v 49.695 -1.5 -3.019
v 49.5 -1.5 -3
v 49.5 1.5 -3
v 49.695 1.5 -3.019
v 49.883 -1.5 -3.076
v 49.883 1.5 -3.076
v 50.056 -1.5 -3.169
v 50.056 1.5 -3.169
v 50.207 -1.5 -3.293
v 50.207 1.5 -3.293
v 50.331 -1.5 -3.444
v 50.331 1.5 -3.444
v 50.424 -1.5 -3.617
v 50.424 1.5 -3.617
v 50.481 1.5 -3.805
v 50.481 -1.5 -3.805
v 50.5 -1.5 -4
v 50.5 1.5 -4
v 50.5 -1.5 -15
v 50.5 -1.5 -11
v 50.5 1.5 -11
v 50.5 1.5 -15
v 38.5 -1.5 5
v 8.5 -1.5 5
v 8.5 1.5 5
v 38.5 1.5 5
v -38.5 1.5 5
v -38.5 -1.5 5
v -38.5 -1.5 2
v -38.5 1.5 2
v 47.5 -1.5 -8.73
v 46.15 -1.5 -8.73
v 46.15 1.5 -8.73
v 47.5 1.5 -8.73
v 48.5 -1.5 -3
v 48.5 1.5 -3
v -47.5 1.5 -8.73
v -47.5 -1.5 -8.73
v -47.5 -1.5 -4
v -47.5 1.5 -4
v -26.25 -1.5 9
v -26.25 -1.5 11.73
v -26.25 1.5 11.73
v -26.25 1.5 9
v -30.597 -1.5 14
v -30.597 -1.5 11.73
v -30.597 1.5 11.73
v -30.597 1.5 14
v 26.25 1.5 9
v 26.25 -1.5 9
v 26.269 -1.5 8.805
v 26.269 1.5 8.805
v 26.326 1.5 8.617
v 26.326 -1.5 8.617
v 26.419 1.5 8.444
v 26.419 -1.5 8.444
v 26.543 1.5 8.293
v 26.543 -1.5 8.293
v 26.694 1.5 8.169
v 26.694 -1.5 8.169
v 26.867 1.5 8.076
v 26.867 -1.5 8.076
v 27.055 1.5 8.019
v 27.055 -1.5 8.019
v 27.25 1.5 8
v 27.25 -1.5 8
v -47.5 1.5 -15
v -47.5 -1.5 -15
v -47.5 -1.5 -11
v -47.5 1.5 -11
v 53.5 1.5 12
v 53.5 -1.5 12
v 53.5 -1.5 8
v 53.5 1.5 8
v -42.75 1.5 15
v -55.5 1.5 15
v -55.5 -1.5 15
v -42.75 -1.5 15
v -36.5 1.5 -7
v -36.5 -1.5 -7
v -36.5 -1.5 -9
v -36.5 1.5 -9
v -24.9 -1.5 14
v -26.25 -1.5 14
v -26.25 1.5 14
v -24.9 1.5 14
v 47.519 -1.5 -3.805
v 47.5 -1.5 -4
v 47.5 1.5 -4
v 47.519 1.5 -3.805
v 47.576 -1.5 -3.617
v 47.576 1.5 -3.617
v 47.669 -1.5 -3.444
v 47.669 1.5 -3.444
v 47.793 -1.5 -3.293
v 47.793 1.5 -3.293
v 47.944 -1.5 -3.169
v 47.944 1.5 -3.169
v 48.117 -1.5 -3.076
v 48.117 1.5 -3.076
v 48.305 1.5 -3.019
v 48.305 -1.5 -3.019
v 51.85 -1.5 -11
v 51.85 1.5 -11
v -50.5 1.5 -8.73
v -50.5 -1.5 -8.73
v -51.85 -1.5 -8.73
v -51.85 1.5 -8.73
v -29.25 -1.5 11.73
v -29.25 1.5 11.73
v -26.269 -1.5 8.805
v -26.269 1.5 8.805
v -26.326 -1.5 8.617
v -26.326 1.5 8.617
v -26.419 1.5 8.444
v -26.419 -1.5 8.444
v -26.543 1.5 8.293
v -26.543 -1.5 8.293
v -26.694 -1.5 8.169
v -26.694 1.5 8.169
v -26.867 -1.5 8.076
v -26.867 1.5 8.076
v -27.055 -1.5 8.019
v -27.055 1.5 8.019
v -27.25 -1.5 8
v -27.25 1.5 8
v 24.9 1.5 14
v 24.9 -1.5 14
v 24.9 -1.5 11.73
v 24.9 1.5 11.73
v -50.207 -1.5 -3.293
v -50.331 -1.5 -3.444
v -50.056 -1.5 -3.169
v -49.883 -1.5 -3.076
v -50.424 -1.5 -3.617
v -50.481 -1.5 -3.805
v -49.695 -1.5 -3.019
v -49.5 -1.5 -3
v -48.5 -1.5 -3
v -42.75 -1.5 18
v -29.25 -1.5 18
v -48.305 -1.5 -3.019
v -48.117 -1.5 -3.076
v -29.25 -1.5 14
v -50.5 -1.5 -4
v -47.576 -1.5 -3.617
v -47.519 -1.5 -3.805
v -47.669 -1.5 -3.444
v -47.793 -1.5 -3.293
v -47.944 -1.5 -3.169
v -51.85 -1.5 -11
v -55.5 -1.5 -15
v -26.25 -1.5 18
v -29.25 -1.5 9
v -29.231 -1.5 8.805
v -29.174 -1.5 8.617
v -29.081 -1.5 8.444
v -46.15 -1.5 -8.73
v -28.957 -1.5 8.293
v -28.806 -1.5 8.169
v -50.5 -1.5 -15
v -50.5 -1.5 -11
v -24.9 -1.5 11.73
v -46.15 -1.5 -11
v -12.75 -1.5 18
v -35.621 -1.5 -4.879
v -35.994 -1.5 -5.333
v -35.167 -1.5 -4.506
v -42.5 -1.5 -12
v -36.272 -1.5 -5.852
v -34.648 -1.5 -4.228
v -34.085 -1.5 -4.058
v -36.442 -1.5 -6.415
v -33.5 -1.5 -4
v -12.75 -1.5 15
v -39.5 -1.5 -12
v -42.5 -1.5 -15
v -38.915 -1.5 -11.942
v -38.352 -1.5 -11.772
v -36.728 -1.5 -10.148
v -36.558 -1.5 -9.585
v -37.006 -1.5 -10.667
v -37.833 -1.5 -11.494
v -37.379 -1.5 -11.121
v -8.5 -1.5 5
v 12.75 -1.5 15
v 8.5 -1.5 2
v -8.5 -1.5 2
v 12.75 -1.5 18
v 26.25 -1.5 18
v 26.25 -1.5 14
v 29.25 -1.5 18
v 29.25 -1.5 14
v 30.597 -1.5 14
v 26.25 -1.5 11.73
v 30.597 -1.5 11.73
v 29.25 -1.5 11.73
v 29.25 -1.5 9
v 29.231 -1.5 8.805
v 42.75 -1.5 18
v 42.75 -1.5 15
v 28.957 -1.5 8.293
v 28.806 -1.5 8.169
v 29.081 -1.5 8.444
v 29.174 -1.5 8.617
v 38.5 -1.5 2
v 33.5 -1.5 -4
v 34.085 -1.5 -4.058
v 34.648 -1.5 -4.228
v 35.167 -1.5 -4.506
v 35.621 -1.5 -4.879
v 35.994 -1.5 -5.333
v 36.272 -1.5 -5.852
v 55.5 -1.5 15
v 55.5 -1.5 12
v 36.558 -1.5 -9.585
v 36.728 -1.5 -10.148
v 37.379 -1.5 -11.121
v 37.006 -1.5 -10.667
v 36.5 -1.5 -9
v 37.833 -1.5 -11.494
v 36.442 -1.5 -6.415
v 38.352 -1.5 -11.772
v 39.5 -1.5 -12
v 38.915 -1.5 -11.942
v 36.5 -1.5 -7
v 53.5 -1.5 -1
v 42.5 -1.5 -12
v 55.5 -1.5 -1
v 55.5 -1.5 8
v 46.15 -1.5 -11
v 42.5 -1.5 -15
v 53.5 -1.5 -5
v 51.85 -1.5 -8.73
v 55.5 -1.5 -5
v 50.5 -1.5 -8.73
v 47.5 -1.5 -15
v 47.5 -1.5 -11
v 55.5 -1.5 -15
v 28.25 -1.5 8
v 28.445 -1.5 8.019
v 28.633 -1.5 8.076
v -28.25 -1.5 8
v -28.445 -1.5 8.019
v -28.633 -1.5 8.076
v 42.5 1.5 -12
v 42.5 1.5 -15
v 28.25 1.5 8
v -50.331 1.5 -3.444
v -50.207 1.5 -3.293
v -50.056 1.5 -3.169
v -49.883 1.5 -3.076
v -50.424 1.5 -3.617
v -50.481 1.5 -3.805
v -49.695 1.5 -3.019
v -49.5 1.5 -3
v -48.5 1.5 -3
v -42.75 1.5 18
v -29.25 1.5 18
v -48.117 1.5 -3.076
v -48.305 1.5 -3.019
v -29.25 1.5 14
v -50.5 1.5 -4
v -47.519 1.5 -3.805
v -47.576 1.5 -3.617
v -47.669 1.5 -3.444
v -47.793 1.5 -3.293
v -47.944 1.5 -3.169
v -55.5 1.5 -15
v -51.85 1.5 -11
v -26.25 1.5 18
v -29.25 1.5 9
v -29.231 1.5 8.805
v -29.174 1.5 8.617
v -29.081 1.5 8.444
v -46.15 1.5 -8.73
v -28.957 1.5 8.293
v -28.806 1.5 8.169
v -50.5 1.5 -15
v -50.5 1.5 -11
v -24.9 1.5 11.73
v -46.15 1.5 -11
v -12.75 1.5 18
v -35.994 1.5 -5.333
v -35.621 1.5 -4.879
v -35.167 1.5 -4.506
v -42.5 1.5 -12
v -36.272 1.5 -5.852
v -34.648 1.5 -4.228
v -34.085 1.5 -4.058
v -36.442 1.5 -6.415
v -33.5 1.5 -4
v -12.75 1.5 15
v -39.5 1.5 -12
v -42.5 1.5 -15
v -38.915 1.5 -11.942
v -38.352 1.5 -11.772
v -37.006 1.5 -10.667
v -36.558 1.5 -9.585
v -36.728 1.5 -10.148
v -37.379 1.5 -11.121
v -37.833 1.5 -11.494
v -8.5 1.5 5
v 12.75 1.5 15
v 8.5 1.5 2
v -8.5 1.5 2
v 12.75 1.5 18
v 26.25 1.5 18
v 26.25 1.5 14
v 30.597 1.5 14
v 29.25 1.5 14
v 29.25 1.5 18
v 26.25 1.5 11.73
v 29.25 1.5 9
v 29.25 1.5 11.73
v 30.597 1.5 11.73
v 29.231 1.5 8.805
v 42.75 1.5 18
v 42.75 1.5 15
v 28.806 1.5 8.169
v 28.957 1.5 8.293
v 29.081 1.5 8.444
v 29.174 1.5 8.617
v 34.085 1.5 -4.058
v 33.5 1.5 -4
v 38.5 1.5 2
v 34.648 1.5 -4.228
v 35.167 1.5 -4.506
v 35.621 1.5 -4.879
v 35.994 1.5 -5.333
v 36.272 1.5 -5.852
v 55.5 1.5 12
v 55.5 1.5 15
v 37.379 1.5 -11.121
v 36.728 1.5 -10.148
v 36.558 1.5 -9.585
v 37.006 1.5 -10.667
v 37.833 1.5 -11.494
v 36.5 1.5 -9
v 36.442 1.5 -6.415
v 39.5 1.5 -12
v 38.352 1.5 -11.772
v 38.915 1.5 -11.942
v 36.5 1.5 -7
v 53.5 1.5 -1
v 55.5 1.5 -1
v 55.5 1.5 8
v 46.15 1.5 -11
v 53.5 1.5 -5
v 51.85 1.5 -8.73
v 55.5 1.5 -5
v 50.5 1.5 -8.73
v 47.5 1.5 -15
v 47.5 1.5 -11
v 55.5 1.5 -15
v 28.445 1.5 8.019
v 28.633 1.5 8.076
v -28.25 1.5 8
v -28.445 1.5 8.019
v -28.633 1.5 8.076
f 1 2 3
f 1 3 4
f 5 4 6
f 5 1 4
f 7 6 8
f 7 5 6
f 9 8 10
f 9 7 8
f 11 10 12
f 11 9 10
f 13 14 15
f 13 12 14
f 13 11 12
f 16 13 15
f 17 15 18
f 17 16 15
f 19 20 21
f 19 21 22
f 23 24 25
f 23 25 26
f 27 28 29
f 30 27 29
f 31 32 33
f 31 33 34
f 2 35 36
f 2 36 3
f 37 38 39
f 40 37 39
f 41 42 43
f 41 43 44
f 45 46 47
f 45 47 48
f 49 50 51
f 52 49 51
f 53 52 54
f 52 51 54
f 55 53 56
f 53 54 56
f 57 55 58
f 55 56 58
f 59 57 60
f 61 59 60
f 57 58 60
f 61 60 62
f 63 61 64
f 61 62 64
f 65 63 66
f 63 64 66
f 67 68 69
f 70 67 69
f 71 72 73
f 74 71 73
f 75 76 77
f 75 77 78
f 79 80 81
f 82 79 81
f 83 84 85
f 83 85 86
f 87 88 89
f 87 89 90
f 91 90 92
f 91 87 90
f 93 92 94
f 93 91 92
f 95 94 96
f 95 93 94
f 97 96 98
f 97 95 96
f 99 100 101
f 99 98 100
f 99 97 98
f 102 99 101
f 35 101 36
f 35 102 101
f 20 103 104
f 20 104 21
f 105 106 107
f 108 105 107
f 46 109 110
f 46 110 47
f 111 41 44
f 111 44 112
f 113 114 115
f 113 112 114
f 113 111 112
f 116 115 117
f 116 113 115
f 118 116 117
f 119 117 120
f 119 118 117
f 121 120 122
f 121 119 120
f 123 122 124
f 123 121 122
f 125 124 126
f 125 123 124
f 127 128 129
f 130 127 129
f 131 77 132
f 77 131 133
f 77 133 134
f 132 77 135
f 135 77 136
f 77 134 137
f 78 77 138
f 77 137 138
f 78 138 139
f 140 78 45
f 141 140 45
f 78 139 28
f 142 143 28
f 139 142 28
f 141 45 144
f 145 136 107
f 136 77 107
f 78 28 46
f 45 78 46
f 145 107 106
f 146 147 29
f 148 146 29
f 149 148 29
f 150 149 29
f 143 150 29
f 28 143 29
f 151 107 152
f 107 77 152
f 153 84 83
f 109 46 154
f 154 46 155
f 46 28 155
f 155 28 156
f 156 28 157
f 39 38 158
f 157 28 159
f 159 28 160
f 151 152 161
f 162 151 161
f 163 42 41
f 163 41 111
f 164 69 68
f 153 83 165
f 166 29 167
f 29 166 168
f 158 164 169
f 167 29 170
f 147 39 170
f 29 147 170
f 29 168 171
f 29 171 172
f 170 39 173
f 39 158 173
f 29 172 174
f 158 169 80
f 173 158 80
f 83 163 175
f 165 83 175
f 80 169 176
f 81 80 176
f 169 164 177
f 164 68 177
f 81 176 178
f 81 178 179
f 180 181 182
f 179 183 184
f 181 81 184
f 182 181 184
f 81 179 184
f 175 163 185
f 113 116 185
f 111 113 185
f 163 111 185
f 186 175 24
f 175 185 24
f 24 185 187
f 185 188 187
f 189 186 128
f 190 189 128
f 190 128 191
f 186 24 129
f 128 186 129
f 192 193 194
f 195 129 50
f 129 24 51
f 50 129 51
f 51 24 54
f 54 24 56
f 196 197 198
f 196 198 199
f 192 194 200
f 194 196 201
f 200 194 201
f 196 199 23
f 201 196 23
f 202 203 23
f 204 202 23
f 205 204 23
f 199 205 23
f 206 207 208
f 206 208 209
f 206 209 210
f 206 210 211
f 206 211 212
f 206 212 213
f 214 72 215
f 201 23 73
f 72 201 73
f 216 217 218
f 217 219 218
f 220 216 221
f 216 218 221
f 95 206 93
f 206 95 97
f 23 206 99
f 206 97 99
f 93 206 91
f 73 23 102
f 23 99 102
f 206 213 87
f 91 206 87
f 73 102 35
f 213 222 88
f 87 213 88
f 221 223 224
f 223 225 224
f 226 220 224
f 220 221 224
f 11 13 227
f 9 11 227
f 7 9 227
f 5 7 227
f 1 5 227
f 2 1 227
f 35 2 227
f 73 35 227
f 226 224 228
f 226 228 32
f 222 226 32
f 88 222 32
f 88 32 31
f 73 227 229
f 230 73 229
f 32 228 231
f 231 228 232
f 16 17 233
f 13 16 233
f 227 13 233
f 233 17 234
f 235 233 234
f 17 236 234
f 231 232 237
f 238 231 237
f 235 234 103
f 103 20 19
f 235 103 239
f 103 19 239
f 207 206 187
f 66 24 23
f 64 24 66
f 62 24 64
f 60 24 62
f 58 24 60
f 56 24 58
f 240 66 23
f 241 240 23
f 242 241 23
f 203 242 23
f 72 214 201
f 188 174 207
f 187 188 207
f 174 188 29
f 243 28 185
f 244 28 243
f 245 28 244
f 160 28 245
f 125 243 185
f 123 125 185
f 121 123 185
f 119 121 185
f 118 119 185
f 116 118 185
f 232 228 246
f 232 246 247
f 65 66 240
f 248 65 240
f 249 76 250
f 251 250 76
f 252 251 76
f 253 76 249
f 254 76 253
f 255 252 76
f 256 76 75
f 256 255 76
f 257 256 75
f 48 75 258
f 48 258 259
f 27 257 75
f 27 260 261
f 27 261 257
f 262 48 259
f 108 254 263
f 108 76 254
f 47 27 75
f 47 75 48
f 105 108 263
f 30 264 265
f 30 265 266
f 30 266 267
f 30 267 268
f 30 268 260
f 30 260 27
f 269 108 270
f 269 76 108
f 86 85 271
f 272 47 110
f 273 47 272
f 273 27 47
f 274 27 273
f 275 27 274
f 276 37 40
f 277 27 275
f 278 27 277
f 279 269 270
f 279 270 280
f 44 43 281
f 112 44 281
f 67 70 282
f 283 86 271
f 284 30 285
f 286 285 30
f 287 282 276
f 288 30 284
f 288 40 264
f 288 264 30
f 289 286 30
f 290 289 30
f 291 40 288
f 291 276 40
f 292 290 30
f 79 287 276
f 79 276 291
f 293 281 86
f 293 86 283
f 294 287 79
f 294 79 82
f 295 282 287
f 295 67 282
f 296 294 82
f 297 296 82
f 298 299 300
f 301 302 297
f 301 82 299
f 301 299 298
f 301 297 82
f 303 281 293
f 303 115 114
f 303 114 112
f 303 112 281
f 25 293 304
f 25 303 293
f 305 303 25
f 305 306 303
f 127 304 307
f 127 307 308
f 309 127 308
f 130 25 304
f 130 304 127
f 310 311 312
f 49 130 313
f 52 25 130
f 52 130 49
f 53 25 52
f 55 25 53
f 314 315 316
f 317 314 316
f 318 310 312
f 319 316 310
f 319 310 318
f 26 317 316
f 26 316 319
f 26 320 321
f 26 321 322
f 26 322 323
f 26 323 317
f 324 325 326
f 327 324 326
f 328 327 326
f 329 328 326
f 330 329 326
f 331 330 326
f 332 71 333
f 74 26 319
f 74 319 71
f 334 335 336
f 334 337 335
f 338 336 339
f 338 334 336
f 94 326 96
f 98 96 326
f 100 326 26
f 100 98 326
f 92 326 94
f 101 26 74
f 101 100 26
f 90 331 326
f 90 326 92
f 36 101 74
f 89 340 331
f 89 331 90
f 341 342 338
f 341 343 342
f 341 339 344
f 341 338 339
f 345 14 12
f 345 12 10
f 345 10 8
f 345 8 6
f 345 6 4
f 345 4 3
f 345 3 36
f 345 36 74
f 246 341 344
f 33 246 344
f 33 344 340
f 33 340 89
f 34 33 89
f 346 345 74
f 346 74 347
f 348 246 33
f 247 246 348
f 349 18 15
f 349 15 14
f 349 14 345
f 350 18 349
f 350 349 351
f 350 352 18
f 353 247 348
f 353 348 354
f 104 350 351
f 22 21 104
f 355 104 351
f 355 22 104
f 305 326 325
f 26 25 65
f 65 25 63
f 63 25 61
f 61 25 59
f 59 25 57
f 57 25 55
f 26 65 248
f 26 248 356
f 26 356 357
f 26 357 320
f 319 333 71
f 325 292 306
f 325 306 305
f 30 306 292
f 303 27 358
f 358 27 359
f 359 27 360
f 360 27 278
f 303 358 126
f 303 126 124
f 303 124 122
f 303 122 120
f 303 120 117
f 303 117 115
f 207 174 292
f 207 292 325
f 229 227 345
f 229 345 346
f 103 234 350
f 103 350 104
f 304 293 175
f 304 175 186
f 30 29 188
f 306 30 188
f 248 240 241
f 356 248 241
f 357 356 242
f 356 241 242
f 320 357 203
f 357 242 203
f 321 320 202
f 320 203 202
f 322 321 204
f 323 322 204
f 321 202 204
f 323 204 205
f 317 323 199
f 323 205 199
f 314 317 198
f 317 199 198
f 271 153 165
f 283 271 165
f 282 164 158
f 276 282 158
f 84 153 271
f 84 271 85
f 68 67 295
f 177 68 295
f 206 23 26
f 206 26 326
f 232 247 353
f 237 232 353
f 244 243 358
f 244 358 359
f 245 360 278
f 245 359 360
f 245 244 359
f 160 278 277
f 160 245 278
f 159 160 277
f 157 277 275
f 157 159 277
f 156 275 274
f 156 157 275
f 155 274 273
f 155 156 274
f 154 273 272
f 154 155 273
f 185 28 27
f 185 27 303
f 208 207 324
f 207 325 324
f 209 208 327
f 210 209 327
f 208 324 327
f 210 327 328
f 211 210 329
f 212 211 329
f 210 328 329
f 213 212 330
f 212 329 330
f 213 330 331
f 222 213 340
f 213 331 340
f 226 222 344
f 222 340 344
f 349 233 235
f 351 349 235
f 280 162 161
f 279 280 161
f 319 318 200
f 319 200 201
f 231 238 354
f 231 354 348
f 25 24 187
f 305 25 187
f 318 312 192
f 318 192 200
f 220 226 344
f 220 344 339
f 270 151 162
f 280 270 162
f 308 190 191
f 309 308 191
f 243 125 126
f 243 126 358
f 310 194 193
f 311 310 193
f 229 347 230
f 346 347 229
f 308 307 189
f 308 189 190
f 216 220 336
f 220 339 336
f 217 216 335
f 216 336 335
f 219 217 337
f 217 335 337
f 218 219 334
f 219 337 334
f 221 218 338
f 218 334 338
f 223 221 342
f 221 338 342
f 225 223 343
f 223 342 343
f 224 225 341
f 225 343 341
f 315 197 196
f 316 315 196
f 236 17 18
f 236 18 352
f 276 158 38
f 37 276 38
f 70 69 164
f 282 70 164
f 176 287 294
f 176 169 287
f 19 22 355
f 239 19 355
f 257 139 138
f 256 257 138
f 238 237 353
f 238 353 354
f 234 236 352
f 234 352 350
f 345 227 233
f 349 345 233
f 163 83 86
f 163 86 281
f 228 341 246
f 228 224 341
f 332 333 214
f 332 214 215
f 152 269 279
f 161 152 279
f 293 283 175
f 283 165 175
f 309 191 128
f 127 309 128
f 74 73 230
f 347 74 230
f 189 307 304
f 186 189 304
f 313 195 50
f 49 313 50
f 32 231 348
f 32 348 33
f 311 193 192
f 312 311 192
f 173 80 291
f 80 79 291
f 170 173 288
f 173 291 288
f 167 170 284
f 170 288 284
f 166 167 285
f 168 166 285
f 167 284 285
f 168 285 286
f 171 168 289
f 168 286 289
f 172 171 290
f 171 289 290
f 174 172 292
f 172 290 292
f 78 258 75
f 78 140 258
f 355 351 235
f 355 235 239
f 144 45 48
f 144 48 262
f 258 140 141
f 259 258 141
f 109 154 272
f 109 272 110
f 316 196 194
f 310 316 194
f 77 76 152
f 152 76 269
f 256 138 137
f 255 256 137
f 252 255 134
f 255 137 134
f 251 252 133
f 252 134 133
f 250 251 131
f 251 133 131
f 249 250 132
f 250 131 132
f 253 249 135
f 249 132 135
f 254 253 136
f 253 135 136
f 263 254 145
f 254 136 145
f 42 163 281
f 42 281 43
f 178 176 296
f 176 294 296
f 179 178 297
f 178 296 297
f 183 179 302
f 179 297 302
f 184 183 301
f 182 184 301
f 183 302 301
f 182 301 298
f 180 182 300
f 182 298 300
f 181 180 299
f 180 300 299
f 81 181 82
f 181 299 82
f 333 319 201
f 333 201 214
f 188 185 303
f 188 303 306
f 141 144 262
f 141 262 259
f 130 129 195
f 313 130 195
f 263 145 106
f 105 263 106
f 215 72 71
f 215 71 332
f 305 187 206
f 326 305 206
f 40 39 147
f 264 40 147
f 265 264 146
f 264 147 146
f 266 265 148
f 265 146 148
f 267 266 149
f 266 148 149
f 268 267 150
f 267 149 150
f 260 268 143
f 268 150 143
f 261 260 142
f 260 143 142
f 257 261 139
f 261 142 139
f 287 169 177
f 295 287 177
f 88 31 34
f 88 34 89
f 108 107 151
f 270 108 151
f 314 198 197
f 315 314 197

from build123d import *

# Parameters (mm, degrees)
SKETCH1_W               = 111
SKETCH1_H               = 30
BOSS_EXTRUDE1_DEPTH     = 1.5
SKETCH2_W               = 30
SKETCH2_H               = 3
BOSS_EXTRUDE2_DEPTH     = 1.5
CUT_EXTRUDE2_DEPTH      = 59.365229375
CUT_EXTRUDE2_DEPTH_BACK = 59.365229375
CUT_EXTRUDE3_DEPTH      = 59.365229375
CUT_EXTRUDE3_DEPTH_BACK = 59.365229375
SKETCH6_W               = 2
SKETCH6_H               = 4
CUT_EXTRUDE4_DEPTH      = 59.423026282
CUT_EXTRUDE4_DEPTH_BACK = 59.423026282
SKETCH7_W               = 30
SKETCH7_H               = 3
CUT_EXTRUDE5_DEPTH      = 59.365229375
CUT_EXTRUDE5_DEPTH_BACK = 59.365229375
SKETCH8_W               = 85
SKETCH8_H               = 3
CUT_EXTRUDE7_DEPTH      = 59.365229375
CUT_EXTRUDE7_DEPTH_BACK = 59.365229375
SKETCH10_W              = 73
SKETCH10_H              = 8
FILLET1_R               = 3
CUT_EXTRUDE6_DEPTH      = 59.365229375
CUT_EXTRUDE6_DEPTH_BACK = 59.365229375


with BuildPart() as part:
    # Sketch1 → Boss-Extrude1 (new, symmetric)
    with BuildSketch(Plane(origin=(0, 0, 0), x_dir=(1, 0, 0), z_dir=(0, 1, 0))):
        Rectangle(SKETCH1_W, SKETCH1_H)
    extrude(amount=BOSS_EXTRUDE1_DEPTH, both=True)

    # Sketch2 → Boss-Extrude2 (add, symmetric)
    with BuildSketch(Plane(origin=(0, 0, 0), x_dir=(1, 0, 0), z_dir=(0, 1, 0))):
        with Locations((-27.75, -16.5)):
            Rectangle(SKETCH2_W, SKETCH2_H)
        with Locations((27.75, -16.5)):
            Rectangle(SKETCH2_W, SKETCH2_H)
    extrude(amount=BOSS_EXTRUDE2_DEPTH, both=True)

    # Sketch5 → Cut-Extrude2 (cut, two sides: drawn at the far end of the back side and taken through both)
    with BuildSketch(Plane(origin=(0, 0, 0), x_dir=(1, 0, 0), z_dir=(0, 1, 0)).offset(-CUT_EXTRUDE2_DEPTH_BACK)):
        with BuildLine():
            Line((-29.25, -18), (-26.25, -18))
            Line((-26.25, -18), (-26.25, -14))
            Line((-26.25, -14), (-24.9, -14))
            Line((-24.9, -14), (-24.9, -11.73))
            Line((-24.9, -11.73), (-26.25, -11.73))
            Line((-26.25, -11.73), (-26.25, -9))
            ThreePointArc((-26.25, -9), (-26.542893219, -8.292893219), (-27.25, -8))
            Line((-27.25, -8), (-28.25, -8))
            ThreePointArc((-28.25, -8), (-28.957106781, -8.292893219), (-29.25, -9))
            Line((-29.25, -9), (-29.25, -11.73))
            Line((-29.25, -11.73), (-30.596948556, -11.73))
            Line((-30.596948556, -11.73), (-30.596948556, -14))
            Line((-30.596948556, -14), (-29.25, -14))
            Line((-29.25, -14), (-29.25, -18))
        make_face()
        with BuildLine():
            Line((26.25, -14), (24.9, -14))
            Line((24.9, -14), (24.9, -11.73))
            Line((24.9, -11.73), (26.25, -11.73))
            Line((26.25, -11.73), (26.25, -9))
            ThreePointArc((26.25, -9), (26.542893219, -8.292893219), (27.25, -8))
            Line((27.25, -8), (28.25, -8))
            ThreePointArc((28.25, -8), (28.957106781, -8.292893219), (29.25, -9))
            Line((29.25, -9), (29.25, -11.73))
            Line((29.25, -11.73), (30.596948556, -11.73))
            Line((30.596948556, -11.73), (30.596948556, -14))
            Line((30.596948556, -14), (29.25, -14))
            Line((29.25, -14), (29.25, -18))
            Line((29.25, -18), (26.25, -18))
            Line((26.25, -18), (26.25, -14))
        make_face()
    extrude(amount=CUT_EXTRUDE2_DEPTH + CUT_EXTRUDE2_DEPTH_BACK, mode=Mode.SUBTRACT)

    # Sketch6 → Cut-Extrude3 (cut, two sides: drawn at the far end of the back side and taken through both)
    with BuildSketch(Plane(origin=(0, 0, 0), x_dir=(1, 0, 0), z_dir=(0, 1, 0)).offset(-CUT_EXTRUDE3_DEPTH_BACK)):
        with Locations((54.5, -10)):
            Rectangle(SKETCH6_W, SKETCH6_H)
        with Locations((54.5, 3)):
            Rectangle(SKETCH6_W, SKETCH6_H)
    extrude(amount=CUT_EXTRUDE3_DEPTH + CUT_EXTRUDE3_DEPTH_BACK, mode=Mode.SUBTRACT)

    # Sketch7 → Cut-Extrude4 (cut, two sides: drawn at the far end of the back side and taken through both)
    with BuildSketch(Plane(origin=(0, 1.5, 0), x_dir=(1, 0, 0), z_dir=(0, 1, 0)).offset(-CUT_EXTRUDE4_DEPTH_BACK)):
        with Locations((-23.5, -3.5)):
            Rectangle(SKETCH7_W, SKETCH7_H)
        with Locations((23.5, -3.5)):
            Rectangle(SKETCH7_W, SKETCH7_H)
    extrude(amount=CUT_EXTRUDE4_DEPTH + CUT_EXTRUDE4_DEPTH_BACK, mode=Mode.SUBTRACT)

    # Sketch8 → Cut-Extrude5 (cut, two sides: drawn at the far end of the back side and taken through both)
    with BuildSketch(Plane(origin=(0, 0, 0), x_dir=(1, 0, 0), z_dir=(0, 1, 0)).offset(-CUT_EXTRUDE5_DEPTH_BACK)):
        with Locations((0, 13.5)):
            Rectangle(SKETCH8_W, SKETCH8_H)
    extrude(amount=CUT_EXTRUDE5_DEPTH + CUT_EXTRUDE5_DEPTH_BACK, mode=Mode.SUBTRACT)

    # Sketch10 → Cut-Extrude7 (cut, two sides: drawn at the far end of the back side and taken through both)
    with BuildSketch(Plane(origin=(0, 0, 0), x_dir=(1, 0, 0), z_dir=(0, 1, 0)).offset(-CUT_EXTRUDE7_DEPTH_BACK)):
        with Locations((0, 8)):
            Rectangle(SKETCH10_W, SKETCH10_H)
    extrude(amount=CUT_EXTRUDE7_DEPTH + CUT_EXTRUDE7_DEPTH_BACK, mode=Mode.SUBTRACT)

    # Fillet1
    fillet1_edges = [part.edges().sort_by_distance(p)[0] for p in [
        (-36.5, 0, -4),
        (-36.5, 0, -12),
        (36.5, 0, -12),
        (36.5, 0, -4),
    ]]
    fillet(fillet1_edges, radius=FILLET1_R)

    # Sketch9 → Cut-Extrude6 (cut, two sides: drawn at the far end of the back side and taken through both)
    with BuildSketch(Plane(origin=(0, 0, 0), x_dir=(1, 0, 0), z_dir=(0, 1, 0)).offset(-CUT_EXTRUDE6_DEPTH_BACK)):
        with BuildLine():
            Line((-50.5, 15), (-47.5, 15))
            Line((-47.5, 15), (-47.5, 11))
            Line((-47.5, 11), (-46.15, 11))
            Line((-46.15, 11), (-46.15, 8.73))
            Line((-46.15, 8.73), (-47.5, 8.73))
            Line((-47.5, 8.73), (-47.5, 4))
            ThreePointArc((-47.5, 4), (-47.792893219, 3.292893219), (-48.5, 3))
            Line((-48.5, 3), (-49.5, 3))
            ThreePointArc((-49.5, 3), (-50.207106781, 3.292893219), (-50.5, 4))
            Line((-50.5, 4), (-50.5, 8.73))
            Line((-50.5, 8.73), (-51.85, 8.73))
            Line((-51.85, 8.73), (-51.85, 11))
            Line((-51.85, 11), (-50.5, 11))
            Line((-50.5, 11), (-50.5, 15))
        make_face()
        with BuildLine():
            Line((47.5, 8.73), (47.5, 4))
            ThreePointArc((47.5, 4), (47.792893219, 3.292893219), (48.5, 3))
            Line((48.5, 3), (49.5, 3))
            ThreePointArc((49.5, 3), (50.207106781, 3.292893219), (50.5, 4))
            Line((50.5, 4), (50.5, 8.73))
            Line((50.5, 8.73), (51.85, 8.73))
            Line((51.85, 8.73), (51.85, 11))
            Line((51.85, 11), (50.5, 11))
            Line((50.5, 11), (50.5, 15))
            Line((50.5, 15), (47.5, 15))
            Line((47.5, 15), (47.5, 11))
            Line((47.5, 11), (46.15, 11))
            Line((46.15, 11), (46.15, 8.73))
            Line((46.15, 8.73), (47.5, 8.73))
        make_face()
    extrude(amount=CUT_EXTRUDE6_DEPTH + CUT_EXTRUDE6_DEPTH_BACK, mode=Mode.SUBTRACT)


solid = part.part
